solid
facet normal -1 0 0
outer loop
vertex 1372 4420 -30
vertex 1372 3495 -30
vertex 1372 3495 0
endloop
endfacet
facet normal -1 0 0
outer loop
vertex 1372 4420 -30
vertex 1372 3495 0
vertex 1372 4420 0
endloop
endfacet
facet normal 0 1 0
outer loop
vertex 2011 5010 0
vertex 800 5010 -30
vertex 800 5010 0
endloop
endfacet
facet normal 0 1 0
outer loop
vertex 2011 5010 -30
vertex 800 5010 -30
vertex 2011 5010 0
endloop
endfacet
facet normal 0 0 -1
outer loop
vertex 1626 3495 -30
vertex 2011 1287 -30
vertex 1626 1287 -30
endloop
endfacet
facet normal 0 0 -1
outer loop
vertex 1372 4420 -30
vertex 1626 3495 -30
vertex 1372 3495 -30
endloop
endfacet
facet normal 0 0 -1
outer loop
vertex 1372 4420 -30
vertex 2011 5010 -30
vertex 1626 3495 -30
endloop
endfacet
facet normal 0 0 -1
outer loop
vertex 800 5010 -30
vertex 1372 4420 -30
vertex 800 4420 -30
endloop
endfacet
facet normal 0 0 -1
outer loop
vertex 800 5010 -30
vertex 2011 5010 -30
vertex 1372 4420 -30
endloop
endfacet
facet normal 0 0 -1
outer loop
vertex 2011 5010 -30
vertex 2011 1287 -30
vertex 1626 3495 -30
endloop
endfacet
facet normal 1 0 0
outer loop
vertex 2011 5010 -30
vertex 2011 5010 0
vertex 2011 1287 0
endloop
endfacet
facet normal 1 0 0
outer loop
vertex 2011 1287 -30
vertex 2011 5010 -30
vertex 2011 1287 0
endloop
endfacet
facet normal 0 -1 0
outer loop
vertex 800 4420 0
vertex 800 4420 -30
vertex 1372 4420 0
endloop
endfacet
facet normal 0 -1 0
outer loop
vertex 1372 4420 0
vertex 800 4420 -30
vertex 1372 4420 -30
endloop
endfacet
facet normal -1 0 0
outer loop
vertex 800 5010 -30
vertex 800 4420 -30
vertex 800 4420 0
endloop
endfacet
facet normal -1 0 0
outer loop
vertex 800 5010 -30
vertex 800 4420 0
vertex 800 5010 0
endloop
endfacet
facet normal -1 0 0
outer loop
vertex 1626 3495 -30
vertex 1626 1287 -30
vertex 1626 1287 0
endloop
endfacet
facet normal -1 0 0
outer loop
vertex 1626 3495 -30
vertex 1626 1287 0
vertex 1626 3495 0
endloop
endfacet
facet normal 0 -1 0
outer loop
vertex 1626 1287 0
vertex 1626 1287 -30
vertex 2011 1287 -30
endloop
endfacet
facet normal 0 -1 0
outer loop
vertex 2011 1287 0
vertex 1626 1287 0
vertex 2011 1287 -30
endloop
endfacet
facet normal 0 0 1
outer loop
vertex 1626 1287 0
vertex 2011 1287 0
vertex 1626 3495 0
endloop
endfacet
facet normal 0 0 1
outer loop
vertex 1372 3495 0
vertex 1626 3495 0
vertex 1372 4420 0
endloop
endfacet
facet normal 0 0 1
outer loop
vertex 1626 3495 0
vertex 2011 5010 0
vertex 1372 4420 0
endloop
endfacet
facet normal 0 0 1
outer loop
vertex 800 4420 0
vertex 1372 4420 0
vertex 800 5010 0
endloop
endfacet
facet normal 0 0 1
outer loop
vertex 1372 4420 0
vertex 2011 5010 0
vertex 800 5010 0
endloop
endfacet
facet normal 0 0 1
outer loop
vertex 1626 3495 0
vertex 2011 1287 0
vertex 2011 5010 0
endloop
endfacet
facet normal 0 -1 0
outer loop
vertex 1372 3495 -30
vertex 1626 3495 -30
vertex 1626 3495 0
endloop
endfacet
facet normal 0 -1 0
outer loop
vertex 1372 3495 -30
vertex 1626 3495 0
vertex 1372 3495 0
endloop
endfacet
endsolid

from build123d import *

# Parameters (mm, degrees)
TABAN_FLAN_1_DEPTH         = 30
KES_EKSTR_ZYON1_DEPTH      = 6352.822258219
KES_EKSTR_ZYON1_DEPTH_BACK = 6352.822258219
IZIM2_W                    = 259
IZIM2_H                    = 3030
KES_EKSTR_ZYON2_DEPTH      = 6352.822258219
KES_EKSTR_ZYON2_DEPTH_BACK = 6352.822258219
KES_EKSTR_ZYON3_DEPTH      = 6352.822258219
KES_EKSTR_ZYON3_DEPTH_BACK = 6352.822258219
IZIM4_W                    = 1491
IZIM4_H                    = 1015
KES_EKSTR_ZYON4_DEPTH      = 5399.622139028
KES_EKSTR_ZYON4_DEPTH_BACK = 5399.622139028
IZIM5_W                    = 170
IZIM5_H                    = 2081
KES_EKSTR_ZYON5_DEPTH      = 5399.622139028
KES_EKSTR_ZYON5_DEPTH_BACK = 5399.622139028
KES_EKSTR_ZYON7_DEPTH      = 5399.622139028
KES_EKSTR_ZYON7_DEPTH_BACK = 5399.622139028
IZIM7_W                    = 280
IZIM7_H                    = 2181
KES_EKSTR_ZYON8_DEPTH      = 5399.622139028
KES_EKSTR_ZYON8_DEPTH_BACK = 5399.622139028
IZIM8_W                    = 140
IZIM8_H                    = 365
KES_EKSTR_ZYON9_DEPTH      = 5399.622139028
KES_EKSTR_ZYON9_DEPTH_BACK = 5399.622139028
IZIM9_W                    = 572
IZIM9_H                    = 626
IZIM9_W_2                  = 385
IZIM9_H_2                  = 3


# Sheet-metal steps are written as plain solids
with BuildPart() as part:
    # Çizim1 → Taban-Flanş1 (new body)
    with BuildSketch(Plane.XY):
        Polygon((0, 0), (0, 3000), (261, 3000), (261, 6025), (2011, 6025), (2011, 0), align=None)
    extrude(amount=-TABAN_FLAN_1_DEPTH)

    # Çizim2 → Kes-Ekstrüzyon1 (cut, two sides: drawn at the far end of the back side and taken through both)
    with BuildSketch(Plane.XY.offset(-KES_EKSTR_ZYON1_DEPTH_BACK)):
        with Locations((390.5, 4510)):
            Rectangle(IZIM2_W, IZIM2_H)
    extrude(amount=KES_EKSTR_ZYON1_DEPTH + KES_EKSTR_ZYON1_DEPTH_BACK, mode=Mode.SUBTRACT)

    # Çizim3 → Kes-Ekstrüzyon2 (cut, two sides: drawn at the far end of the back side and taken through both)
    with BuildSketch(Plane.XY.offset(-KES_EKSTR_ZYON2_DEPTH_BACK)):
        Polygon((0, 919), (1200, 919), (1200, 1284), (2011, 1284), (2011, 0), (0, 0), align=None)
    extrude(amount=KES_EKSTR_ZYON2_DEPTH + KES_EKSTR_ZYON2_DEPTH_BACK, mode=Mode.SUBTRACT)

    # Çizim4 → Kes-Ekstrüzyon3 (cut, two sides: drawn at the far end of the back side and taken through both)
    with BuildSketch(Plane.XY.offset(-KES_EKSTR_ZYON3_DEPTH_BACK)):
        with Locations((1265.5, 5517.5)):
            Rectangle(IZIM4_W, IZIM4_H)
    extrude(amount=KES_EKSTR_ZYON3_DEPTH + KES_EKSTR_ZYON3_DEPTH_BACK, mode=Mode.SUBTRACT)

    # Çizim5 → Kes-Ekstrüzyon4 (cut, two sides: drawn at the far end of the back side and taken through both)
    with BuildSketch(Plane.XY.offset(-KES_EKSTR_ZYON4_DEPTH_BACK)):
        with Locations((85, 1959.5)):
            Rectangle(IZIM5_W, IZIM5_H)
    extrude(amount=KES_EKSTR_ZYON4_DEPTH + KES_EKSTR_ZYON4_DEPTH_BACK, mode=Mode.SUBTRACT)

    # Çizim6 → Kes-Ekstrüzyon5 (cut, two sides: drawn at the far end of the back side and taken through both)
    with BuildSketch(Plane.XY.offset(-KES_EKSTR_ZYON5_DEPTH_BACK)):
        Polygon((520, 2995), (520, 2829), (800, 2829), (800, 1465.844716129), (800, 919), (0, 663.665767546), (0, 3349.606588957), align=None)
    extrude(amount=KES_EKSTR_ZYON5_DEPTH + KES_EKSTR_ZYON5_DEPTH_BACK, mode=Mode.SUBTRACT)

    # Çizim7 → Kes-Ekstrüzyon7 (cut, two sides: drawn at the far end of the back side and taken through both)
    with BuildSketch(Plane.XY.offset(-KES_EKSTR_ZYON7_DEPTH_BACK)):
        with Locations((660, 3919.5)):
            Rectangle(IZIM7_W, IZIM7_H)
    extrude(amount=KES_EKSTR_ZYON7_DEPTH + KES_EKSTR_ZYON7_DEPTH_BACK, mode=Mode.SUBTRACT)

    # Çizim8 → Kes-Ekstrüzyon8 (cut, two sides: drawn at the far end of the back side and taken through both)
    with BuildSketch(Plane.XY.offset(-KES_EKSTR_ZYON8_DEPTH_BACK)):
        Polygon((1060, 3794), (800, 3794), (800, 919), (1060, 919), (1060, 1284), align=None)
        Polygon((1372, 3794), (1060, 3794), (1060, 1284), (1200, 1284), (1372, 1284), align=None)
        with Locations((1130, 1101.5)):
            Rectangle(IZIM8_W, IZIM8_H)
    extrude(amount=KES_EKSTR_ZYON8_DEPTH + KES_EKSTR_ZYON8_DEPTH_BACK, mode=Mode.SUBTRACT)

    # Çizim9 → Kes-Ekstrüzyon9 (cut, two sides: drawn at the far end of the back side and taken through both)
    with BuildSketch(Plane.XY.offset(-KES_EKSTR_ZYON9_DEPTH_BACK)):
        with Locations((1086, 4107)):
            Rectangle(IZIM9_W, IZIM9_H)
        Polygon((1626, 3495), (1372, 3495), (1372, 1284), (1626, 1284), (1626, 1287), align=None)
        with Locations((1818.5, 1285.5)):
            Rectangle(IZIM9_W_2, IZIM9_H_2)
    extrude(amount=KES_EKSTR_ZYON9_DEPTH + KES_EKSTR_ZYON9_DEPTH_BACK, mode=Mode.SUBTRACT)


solid = part.part
